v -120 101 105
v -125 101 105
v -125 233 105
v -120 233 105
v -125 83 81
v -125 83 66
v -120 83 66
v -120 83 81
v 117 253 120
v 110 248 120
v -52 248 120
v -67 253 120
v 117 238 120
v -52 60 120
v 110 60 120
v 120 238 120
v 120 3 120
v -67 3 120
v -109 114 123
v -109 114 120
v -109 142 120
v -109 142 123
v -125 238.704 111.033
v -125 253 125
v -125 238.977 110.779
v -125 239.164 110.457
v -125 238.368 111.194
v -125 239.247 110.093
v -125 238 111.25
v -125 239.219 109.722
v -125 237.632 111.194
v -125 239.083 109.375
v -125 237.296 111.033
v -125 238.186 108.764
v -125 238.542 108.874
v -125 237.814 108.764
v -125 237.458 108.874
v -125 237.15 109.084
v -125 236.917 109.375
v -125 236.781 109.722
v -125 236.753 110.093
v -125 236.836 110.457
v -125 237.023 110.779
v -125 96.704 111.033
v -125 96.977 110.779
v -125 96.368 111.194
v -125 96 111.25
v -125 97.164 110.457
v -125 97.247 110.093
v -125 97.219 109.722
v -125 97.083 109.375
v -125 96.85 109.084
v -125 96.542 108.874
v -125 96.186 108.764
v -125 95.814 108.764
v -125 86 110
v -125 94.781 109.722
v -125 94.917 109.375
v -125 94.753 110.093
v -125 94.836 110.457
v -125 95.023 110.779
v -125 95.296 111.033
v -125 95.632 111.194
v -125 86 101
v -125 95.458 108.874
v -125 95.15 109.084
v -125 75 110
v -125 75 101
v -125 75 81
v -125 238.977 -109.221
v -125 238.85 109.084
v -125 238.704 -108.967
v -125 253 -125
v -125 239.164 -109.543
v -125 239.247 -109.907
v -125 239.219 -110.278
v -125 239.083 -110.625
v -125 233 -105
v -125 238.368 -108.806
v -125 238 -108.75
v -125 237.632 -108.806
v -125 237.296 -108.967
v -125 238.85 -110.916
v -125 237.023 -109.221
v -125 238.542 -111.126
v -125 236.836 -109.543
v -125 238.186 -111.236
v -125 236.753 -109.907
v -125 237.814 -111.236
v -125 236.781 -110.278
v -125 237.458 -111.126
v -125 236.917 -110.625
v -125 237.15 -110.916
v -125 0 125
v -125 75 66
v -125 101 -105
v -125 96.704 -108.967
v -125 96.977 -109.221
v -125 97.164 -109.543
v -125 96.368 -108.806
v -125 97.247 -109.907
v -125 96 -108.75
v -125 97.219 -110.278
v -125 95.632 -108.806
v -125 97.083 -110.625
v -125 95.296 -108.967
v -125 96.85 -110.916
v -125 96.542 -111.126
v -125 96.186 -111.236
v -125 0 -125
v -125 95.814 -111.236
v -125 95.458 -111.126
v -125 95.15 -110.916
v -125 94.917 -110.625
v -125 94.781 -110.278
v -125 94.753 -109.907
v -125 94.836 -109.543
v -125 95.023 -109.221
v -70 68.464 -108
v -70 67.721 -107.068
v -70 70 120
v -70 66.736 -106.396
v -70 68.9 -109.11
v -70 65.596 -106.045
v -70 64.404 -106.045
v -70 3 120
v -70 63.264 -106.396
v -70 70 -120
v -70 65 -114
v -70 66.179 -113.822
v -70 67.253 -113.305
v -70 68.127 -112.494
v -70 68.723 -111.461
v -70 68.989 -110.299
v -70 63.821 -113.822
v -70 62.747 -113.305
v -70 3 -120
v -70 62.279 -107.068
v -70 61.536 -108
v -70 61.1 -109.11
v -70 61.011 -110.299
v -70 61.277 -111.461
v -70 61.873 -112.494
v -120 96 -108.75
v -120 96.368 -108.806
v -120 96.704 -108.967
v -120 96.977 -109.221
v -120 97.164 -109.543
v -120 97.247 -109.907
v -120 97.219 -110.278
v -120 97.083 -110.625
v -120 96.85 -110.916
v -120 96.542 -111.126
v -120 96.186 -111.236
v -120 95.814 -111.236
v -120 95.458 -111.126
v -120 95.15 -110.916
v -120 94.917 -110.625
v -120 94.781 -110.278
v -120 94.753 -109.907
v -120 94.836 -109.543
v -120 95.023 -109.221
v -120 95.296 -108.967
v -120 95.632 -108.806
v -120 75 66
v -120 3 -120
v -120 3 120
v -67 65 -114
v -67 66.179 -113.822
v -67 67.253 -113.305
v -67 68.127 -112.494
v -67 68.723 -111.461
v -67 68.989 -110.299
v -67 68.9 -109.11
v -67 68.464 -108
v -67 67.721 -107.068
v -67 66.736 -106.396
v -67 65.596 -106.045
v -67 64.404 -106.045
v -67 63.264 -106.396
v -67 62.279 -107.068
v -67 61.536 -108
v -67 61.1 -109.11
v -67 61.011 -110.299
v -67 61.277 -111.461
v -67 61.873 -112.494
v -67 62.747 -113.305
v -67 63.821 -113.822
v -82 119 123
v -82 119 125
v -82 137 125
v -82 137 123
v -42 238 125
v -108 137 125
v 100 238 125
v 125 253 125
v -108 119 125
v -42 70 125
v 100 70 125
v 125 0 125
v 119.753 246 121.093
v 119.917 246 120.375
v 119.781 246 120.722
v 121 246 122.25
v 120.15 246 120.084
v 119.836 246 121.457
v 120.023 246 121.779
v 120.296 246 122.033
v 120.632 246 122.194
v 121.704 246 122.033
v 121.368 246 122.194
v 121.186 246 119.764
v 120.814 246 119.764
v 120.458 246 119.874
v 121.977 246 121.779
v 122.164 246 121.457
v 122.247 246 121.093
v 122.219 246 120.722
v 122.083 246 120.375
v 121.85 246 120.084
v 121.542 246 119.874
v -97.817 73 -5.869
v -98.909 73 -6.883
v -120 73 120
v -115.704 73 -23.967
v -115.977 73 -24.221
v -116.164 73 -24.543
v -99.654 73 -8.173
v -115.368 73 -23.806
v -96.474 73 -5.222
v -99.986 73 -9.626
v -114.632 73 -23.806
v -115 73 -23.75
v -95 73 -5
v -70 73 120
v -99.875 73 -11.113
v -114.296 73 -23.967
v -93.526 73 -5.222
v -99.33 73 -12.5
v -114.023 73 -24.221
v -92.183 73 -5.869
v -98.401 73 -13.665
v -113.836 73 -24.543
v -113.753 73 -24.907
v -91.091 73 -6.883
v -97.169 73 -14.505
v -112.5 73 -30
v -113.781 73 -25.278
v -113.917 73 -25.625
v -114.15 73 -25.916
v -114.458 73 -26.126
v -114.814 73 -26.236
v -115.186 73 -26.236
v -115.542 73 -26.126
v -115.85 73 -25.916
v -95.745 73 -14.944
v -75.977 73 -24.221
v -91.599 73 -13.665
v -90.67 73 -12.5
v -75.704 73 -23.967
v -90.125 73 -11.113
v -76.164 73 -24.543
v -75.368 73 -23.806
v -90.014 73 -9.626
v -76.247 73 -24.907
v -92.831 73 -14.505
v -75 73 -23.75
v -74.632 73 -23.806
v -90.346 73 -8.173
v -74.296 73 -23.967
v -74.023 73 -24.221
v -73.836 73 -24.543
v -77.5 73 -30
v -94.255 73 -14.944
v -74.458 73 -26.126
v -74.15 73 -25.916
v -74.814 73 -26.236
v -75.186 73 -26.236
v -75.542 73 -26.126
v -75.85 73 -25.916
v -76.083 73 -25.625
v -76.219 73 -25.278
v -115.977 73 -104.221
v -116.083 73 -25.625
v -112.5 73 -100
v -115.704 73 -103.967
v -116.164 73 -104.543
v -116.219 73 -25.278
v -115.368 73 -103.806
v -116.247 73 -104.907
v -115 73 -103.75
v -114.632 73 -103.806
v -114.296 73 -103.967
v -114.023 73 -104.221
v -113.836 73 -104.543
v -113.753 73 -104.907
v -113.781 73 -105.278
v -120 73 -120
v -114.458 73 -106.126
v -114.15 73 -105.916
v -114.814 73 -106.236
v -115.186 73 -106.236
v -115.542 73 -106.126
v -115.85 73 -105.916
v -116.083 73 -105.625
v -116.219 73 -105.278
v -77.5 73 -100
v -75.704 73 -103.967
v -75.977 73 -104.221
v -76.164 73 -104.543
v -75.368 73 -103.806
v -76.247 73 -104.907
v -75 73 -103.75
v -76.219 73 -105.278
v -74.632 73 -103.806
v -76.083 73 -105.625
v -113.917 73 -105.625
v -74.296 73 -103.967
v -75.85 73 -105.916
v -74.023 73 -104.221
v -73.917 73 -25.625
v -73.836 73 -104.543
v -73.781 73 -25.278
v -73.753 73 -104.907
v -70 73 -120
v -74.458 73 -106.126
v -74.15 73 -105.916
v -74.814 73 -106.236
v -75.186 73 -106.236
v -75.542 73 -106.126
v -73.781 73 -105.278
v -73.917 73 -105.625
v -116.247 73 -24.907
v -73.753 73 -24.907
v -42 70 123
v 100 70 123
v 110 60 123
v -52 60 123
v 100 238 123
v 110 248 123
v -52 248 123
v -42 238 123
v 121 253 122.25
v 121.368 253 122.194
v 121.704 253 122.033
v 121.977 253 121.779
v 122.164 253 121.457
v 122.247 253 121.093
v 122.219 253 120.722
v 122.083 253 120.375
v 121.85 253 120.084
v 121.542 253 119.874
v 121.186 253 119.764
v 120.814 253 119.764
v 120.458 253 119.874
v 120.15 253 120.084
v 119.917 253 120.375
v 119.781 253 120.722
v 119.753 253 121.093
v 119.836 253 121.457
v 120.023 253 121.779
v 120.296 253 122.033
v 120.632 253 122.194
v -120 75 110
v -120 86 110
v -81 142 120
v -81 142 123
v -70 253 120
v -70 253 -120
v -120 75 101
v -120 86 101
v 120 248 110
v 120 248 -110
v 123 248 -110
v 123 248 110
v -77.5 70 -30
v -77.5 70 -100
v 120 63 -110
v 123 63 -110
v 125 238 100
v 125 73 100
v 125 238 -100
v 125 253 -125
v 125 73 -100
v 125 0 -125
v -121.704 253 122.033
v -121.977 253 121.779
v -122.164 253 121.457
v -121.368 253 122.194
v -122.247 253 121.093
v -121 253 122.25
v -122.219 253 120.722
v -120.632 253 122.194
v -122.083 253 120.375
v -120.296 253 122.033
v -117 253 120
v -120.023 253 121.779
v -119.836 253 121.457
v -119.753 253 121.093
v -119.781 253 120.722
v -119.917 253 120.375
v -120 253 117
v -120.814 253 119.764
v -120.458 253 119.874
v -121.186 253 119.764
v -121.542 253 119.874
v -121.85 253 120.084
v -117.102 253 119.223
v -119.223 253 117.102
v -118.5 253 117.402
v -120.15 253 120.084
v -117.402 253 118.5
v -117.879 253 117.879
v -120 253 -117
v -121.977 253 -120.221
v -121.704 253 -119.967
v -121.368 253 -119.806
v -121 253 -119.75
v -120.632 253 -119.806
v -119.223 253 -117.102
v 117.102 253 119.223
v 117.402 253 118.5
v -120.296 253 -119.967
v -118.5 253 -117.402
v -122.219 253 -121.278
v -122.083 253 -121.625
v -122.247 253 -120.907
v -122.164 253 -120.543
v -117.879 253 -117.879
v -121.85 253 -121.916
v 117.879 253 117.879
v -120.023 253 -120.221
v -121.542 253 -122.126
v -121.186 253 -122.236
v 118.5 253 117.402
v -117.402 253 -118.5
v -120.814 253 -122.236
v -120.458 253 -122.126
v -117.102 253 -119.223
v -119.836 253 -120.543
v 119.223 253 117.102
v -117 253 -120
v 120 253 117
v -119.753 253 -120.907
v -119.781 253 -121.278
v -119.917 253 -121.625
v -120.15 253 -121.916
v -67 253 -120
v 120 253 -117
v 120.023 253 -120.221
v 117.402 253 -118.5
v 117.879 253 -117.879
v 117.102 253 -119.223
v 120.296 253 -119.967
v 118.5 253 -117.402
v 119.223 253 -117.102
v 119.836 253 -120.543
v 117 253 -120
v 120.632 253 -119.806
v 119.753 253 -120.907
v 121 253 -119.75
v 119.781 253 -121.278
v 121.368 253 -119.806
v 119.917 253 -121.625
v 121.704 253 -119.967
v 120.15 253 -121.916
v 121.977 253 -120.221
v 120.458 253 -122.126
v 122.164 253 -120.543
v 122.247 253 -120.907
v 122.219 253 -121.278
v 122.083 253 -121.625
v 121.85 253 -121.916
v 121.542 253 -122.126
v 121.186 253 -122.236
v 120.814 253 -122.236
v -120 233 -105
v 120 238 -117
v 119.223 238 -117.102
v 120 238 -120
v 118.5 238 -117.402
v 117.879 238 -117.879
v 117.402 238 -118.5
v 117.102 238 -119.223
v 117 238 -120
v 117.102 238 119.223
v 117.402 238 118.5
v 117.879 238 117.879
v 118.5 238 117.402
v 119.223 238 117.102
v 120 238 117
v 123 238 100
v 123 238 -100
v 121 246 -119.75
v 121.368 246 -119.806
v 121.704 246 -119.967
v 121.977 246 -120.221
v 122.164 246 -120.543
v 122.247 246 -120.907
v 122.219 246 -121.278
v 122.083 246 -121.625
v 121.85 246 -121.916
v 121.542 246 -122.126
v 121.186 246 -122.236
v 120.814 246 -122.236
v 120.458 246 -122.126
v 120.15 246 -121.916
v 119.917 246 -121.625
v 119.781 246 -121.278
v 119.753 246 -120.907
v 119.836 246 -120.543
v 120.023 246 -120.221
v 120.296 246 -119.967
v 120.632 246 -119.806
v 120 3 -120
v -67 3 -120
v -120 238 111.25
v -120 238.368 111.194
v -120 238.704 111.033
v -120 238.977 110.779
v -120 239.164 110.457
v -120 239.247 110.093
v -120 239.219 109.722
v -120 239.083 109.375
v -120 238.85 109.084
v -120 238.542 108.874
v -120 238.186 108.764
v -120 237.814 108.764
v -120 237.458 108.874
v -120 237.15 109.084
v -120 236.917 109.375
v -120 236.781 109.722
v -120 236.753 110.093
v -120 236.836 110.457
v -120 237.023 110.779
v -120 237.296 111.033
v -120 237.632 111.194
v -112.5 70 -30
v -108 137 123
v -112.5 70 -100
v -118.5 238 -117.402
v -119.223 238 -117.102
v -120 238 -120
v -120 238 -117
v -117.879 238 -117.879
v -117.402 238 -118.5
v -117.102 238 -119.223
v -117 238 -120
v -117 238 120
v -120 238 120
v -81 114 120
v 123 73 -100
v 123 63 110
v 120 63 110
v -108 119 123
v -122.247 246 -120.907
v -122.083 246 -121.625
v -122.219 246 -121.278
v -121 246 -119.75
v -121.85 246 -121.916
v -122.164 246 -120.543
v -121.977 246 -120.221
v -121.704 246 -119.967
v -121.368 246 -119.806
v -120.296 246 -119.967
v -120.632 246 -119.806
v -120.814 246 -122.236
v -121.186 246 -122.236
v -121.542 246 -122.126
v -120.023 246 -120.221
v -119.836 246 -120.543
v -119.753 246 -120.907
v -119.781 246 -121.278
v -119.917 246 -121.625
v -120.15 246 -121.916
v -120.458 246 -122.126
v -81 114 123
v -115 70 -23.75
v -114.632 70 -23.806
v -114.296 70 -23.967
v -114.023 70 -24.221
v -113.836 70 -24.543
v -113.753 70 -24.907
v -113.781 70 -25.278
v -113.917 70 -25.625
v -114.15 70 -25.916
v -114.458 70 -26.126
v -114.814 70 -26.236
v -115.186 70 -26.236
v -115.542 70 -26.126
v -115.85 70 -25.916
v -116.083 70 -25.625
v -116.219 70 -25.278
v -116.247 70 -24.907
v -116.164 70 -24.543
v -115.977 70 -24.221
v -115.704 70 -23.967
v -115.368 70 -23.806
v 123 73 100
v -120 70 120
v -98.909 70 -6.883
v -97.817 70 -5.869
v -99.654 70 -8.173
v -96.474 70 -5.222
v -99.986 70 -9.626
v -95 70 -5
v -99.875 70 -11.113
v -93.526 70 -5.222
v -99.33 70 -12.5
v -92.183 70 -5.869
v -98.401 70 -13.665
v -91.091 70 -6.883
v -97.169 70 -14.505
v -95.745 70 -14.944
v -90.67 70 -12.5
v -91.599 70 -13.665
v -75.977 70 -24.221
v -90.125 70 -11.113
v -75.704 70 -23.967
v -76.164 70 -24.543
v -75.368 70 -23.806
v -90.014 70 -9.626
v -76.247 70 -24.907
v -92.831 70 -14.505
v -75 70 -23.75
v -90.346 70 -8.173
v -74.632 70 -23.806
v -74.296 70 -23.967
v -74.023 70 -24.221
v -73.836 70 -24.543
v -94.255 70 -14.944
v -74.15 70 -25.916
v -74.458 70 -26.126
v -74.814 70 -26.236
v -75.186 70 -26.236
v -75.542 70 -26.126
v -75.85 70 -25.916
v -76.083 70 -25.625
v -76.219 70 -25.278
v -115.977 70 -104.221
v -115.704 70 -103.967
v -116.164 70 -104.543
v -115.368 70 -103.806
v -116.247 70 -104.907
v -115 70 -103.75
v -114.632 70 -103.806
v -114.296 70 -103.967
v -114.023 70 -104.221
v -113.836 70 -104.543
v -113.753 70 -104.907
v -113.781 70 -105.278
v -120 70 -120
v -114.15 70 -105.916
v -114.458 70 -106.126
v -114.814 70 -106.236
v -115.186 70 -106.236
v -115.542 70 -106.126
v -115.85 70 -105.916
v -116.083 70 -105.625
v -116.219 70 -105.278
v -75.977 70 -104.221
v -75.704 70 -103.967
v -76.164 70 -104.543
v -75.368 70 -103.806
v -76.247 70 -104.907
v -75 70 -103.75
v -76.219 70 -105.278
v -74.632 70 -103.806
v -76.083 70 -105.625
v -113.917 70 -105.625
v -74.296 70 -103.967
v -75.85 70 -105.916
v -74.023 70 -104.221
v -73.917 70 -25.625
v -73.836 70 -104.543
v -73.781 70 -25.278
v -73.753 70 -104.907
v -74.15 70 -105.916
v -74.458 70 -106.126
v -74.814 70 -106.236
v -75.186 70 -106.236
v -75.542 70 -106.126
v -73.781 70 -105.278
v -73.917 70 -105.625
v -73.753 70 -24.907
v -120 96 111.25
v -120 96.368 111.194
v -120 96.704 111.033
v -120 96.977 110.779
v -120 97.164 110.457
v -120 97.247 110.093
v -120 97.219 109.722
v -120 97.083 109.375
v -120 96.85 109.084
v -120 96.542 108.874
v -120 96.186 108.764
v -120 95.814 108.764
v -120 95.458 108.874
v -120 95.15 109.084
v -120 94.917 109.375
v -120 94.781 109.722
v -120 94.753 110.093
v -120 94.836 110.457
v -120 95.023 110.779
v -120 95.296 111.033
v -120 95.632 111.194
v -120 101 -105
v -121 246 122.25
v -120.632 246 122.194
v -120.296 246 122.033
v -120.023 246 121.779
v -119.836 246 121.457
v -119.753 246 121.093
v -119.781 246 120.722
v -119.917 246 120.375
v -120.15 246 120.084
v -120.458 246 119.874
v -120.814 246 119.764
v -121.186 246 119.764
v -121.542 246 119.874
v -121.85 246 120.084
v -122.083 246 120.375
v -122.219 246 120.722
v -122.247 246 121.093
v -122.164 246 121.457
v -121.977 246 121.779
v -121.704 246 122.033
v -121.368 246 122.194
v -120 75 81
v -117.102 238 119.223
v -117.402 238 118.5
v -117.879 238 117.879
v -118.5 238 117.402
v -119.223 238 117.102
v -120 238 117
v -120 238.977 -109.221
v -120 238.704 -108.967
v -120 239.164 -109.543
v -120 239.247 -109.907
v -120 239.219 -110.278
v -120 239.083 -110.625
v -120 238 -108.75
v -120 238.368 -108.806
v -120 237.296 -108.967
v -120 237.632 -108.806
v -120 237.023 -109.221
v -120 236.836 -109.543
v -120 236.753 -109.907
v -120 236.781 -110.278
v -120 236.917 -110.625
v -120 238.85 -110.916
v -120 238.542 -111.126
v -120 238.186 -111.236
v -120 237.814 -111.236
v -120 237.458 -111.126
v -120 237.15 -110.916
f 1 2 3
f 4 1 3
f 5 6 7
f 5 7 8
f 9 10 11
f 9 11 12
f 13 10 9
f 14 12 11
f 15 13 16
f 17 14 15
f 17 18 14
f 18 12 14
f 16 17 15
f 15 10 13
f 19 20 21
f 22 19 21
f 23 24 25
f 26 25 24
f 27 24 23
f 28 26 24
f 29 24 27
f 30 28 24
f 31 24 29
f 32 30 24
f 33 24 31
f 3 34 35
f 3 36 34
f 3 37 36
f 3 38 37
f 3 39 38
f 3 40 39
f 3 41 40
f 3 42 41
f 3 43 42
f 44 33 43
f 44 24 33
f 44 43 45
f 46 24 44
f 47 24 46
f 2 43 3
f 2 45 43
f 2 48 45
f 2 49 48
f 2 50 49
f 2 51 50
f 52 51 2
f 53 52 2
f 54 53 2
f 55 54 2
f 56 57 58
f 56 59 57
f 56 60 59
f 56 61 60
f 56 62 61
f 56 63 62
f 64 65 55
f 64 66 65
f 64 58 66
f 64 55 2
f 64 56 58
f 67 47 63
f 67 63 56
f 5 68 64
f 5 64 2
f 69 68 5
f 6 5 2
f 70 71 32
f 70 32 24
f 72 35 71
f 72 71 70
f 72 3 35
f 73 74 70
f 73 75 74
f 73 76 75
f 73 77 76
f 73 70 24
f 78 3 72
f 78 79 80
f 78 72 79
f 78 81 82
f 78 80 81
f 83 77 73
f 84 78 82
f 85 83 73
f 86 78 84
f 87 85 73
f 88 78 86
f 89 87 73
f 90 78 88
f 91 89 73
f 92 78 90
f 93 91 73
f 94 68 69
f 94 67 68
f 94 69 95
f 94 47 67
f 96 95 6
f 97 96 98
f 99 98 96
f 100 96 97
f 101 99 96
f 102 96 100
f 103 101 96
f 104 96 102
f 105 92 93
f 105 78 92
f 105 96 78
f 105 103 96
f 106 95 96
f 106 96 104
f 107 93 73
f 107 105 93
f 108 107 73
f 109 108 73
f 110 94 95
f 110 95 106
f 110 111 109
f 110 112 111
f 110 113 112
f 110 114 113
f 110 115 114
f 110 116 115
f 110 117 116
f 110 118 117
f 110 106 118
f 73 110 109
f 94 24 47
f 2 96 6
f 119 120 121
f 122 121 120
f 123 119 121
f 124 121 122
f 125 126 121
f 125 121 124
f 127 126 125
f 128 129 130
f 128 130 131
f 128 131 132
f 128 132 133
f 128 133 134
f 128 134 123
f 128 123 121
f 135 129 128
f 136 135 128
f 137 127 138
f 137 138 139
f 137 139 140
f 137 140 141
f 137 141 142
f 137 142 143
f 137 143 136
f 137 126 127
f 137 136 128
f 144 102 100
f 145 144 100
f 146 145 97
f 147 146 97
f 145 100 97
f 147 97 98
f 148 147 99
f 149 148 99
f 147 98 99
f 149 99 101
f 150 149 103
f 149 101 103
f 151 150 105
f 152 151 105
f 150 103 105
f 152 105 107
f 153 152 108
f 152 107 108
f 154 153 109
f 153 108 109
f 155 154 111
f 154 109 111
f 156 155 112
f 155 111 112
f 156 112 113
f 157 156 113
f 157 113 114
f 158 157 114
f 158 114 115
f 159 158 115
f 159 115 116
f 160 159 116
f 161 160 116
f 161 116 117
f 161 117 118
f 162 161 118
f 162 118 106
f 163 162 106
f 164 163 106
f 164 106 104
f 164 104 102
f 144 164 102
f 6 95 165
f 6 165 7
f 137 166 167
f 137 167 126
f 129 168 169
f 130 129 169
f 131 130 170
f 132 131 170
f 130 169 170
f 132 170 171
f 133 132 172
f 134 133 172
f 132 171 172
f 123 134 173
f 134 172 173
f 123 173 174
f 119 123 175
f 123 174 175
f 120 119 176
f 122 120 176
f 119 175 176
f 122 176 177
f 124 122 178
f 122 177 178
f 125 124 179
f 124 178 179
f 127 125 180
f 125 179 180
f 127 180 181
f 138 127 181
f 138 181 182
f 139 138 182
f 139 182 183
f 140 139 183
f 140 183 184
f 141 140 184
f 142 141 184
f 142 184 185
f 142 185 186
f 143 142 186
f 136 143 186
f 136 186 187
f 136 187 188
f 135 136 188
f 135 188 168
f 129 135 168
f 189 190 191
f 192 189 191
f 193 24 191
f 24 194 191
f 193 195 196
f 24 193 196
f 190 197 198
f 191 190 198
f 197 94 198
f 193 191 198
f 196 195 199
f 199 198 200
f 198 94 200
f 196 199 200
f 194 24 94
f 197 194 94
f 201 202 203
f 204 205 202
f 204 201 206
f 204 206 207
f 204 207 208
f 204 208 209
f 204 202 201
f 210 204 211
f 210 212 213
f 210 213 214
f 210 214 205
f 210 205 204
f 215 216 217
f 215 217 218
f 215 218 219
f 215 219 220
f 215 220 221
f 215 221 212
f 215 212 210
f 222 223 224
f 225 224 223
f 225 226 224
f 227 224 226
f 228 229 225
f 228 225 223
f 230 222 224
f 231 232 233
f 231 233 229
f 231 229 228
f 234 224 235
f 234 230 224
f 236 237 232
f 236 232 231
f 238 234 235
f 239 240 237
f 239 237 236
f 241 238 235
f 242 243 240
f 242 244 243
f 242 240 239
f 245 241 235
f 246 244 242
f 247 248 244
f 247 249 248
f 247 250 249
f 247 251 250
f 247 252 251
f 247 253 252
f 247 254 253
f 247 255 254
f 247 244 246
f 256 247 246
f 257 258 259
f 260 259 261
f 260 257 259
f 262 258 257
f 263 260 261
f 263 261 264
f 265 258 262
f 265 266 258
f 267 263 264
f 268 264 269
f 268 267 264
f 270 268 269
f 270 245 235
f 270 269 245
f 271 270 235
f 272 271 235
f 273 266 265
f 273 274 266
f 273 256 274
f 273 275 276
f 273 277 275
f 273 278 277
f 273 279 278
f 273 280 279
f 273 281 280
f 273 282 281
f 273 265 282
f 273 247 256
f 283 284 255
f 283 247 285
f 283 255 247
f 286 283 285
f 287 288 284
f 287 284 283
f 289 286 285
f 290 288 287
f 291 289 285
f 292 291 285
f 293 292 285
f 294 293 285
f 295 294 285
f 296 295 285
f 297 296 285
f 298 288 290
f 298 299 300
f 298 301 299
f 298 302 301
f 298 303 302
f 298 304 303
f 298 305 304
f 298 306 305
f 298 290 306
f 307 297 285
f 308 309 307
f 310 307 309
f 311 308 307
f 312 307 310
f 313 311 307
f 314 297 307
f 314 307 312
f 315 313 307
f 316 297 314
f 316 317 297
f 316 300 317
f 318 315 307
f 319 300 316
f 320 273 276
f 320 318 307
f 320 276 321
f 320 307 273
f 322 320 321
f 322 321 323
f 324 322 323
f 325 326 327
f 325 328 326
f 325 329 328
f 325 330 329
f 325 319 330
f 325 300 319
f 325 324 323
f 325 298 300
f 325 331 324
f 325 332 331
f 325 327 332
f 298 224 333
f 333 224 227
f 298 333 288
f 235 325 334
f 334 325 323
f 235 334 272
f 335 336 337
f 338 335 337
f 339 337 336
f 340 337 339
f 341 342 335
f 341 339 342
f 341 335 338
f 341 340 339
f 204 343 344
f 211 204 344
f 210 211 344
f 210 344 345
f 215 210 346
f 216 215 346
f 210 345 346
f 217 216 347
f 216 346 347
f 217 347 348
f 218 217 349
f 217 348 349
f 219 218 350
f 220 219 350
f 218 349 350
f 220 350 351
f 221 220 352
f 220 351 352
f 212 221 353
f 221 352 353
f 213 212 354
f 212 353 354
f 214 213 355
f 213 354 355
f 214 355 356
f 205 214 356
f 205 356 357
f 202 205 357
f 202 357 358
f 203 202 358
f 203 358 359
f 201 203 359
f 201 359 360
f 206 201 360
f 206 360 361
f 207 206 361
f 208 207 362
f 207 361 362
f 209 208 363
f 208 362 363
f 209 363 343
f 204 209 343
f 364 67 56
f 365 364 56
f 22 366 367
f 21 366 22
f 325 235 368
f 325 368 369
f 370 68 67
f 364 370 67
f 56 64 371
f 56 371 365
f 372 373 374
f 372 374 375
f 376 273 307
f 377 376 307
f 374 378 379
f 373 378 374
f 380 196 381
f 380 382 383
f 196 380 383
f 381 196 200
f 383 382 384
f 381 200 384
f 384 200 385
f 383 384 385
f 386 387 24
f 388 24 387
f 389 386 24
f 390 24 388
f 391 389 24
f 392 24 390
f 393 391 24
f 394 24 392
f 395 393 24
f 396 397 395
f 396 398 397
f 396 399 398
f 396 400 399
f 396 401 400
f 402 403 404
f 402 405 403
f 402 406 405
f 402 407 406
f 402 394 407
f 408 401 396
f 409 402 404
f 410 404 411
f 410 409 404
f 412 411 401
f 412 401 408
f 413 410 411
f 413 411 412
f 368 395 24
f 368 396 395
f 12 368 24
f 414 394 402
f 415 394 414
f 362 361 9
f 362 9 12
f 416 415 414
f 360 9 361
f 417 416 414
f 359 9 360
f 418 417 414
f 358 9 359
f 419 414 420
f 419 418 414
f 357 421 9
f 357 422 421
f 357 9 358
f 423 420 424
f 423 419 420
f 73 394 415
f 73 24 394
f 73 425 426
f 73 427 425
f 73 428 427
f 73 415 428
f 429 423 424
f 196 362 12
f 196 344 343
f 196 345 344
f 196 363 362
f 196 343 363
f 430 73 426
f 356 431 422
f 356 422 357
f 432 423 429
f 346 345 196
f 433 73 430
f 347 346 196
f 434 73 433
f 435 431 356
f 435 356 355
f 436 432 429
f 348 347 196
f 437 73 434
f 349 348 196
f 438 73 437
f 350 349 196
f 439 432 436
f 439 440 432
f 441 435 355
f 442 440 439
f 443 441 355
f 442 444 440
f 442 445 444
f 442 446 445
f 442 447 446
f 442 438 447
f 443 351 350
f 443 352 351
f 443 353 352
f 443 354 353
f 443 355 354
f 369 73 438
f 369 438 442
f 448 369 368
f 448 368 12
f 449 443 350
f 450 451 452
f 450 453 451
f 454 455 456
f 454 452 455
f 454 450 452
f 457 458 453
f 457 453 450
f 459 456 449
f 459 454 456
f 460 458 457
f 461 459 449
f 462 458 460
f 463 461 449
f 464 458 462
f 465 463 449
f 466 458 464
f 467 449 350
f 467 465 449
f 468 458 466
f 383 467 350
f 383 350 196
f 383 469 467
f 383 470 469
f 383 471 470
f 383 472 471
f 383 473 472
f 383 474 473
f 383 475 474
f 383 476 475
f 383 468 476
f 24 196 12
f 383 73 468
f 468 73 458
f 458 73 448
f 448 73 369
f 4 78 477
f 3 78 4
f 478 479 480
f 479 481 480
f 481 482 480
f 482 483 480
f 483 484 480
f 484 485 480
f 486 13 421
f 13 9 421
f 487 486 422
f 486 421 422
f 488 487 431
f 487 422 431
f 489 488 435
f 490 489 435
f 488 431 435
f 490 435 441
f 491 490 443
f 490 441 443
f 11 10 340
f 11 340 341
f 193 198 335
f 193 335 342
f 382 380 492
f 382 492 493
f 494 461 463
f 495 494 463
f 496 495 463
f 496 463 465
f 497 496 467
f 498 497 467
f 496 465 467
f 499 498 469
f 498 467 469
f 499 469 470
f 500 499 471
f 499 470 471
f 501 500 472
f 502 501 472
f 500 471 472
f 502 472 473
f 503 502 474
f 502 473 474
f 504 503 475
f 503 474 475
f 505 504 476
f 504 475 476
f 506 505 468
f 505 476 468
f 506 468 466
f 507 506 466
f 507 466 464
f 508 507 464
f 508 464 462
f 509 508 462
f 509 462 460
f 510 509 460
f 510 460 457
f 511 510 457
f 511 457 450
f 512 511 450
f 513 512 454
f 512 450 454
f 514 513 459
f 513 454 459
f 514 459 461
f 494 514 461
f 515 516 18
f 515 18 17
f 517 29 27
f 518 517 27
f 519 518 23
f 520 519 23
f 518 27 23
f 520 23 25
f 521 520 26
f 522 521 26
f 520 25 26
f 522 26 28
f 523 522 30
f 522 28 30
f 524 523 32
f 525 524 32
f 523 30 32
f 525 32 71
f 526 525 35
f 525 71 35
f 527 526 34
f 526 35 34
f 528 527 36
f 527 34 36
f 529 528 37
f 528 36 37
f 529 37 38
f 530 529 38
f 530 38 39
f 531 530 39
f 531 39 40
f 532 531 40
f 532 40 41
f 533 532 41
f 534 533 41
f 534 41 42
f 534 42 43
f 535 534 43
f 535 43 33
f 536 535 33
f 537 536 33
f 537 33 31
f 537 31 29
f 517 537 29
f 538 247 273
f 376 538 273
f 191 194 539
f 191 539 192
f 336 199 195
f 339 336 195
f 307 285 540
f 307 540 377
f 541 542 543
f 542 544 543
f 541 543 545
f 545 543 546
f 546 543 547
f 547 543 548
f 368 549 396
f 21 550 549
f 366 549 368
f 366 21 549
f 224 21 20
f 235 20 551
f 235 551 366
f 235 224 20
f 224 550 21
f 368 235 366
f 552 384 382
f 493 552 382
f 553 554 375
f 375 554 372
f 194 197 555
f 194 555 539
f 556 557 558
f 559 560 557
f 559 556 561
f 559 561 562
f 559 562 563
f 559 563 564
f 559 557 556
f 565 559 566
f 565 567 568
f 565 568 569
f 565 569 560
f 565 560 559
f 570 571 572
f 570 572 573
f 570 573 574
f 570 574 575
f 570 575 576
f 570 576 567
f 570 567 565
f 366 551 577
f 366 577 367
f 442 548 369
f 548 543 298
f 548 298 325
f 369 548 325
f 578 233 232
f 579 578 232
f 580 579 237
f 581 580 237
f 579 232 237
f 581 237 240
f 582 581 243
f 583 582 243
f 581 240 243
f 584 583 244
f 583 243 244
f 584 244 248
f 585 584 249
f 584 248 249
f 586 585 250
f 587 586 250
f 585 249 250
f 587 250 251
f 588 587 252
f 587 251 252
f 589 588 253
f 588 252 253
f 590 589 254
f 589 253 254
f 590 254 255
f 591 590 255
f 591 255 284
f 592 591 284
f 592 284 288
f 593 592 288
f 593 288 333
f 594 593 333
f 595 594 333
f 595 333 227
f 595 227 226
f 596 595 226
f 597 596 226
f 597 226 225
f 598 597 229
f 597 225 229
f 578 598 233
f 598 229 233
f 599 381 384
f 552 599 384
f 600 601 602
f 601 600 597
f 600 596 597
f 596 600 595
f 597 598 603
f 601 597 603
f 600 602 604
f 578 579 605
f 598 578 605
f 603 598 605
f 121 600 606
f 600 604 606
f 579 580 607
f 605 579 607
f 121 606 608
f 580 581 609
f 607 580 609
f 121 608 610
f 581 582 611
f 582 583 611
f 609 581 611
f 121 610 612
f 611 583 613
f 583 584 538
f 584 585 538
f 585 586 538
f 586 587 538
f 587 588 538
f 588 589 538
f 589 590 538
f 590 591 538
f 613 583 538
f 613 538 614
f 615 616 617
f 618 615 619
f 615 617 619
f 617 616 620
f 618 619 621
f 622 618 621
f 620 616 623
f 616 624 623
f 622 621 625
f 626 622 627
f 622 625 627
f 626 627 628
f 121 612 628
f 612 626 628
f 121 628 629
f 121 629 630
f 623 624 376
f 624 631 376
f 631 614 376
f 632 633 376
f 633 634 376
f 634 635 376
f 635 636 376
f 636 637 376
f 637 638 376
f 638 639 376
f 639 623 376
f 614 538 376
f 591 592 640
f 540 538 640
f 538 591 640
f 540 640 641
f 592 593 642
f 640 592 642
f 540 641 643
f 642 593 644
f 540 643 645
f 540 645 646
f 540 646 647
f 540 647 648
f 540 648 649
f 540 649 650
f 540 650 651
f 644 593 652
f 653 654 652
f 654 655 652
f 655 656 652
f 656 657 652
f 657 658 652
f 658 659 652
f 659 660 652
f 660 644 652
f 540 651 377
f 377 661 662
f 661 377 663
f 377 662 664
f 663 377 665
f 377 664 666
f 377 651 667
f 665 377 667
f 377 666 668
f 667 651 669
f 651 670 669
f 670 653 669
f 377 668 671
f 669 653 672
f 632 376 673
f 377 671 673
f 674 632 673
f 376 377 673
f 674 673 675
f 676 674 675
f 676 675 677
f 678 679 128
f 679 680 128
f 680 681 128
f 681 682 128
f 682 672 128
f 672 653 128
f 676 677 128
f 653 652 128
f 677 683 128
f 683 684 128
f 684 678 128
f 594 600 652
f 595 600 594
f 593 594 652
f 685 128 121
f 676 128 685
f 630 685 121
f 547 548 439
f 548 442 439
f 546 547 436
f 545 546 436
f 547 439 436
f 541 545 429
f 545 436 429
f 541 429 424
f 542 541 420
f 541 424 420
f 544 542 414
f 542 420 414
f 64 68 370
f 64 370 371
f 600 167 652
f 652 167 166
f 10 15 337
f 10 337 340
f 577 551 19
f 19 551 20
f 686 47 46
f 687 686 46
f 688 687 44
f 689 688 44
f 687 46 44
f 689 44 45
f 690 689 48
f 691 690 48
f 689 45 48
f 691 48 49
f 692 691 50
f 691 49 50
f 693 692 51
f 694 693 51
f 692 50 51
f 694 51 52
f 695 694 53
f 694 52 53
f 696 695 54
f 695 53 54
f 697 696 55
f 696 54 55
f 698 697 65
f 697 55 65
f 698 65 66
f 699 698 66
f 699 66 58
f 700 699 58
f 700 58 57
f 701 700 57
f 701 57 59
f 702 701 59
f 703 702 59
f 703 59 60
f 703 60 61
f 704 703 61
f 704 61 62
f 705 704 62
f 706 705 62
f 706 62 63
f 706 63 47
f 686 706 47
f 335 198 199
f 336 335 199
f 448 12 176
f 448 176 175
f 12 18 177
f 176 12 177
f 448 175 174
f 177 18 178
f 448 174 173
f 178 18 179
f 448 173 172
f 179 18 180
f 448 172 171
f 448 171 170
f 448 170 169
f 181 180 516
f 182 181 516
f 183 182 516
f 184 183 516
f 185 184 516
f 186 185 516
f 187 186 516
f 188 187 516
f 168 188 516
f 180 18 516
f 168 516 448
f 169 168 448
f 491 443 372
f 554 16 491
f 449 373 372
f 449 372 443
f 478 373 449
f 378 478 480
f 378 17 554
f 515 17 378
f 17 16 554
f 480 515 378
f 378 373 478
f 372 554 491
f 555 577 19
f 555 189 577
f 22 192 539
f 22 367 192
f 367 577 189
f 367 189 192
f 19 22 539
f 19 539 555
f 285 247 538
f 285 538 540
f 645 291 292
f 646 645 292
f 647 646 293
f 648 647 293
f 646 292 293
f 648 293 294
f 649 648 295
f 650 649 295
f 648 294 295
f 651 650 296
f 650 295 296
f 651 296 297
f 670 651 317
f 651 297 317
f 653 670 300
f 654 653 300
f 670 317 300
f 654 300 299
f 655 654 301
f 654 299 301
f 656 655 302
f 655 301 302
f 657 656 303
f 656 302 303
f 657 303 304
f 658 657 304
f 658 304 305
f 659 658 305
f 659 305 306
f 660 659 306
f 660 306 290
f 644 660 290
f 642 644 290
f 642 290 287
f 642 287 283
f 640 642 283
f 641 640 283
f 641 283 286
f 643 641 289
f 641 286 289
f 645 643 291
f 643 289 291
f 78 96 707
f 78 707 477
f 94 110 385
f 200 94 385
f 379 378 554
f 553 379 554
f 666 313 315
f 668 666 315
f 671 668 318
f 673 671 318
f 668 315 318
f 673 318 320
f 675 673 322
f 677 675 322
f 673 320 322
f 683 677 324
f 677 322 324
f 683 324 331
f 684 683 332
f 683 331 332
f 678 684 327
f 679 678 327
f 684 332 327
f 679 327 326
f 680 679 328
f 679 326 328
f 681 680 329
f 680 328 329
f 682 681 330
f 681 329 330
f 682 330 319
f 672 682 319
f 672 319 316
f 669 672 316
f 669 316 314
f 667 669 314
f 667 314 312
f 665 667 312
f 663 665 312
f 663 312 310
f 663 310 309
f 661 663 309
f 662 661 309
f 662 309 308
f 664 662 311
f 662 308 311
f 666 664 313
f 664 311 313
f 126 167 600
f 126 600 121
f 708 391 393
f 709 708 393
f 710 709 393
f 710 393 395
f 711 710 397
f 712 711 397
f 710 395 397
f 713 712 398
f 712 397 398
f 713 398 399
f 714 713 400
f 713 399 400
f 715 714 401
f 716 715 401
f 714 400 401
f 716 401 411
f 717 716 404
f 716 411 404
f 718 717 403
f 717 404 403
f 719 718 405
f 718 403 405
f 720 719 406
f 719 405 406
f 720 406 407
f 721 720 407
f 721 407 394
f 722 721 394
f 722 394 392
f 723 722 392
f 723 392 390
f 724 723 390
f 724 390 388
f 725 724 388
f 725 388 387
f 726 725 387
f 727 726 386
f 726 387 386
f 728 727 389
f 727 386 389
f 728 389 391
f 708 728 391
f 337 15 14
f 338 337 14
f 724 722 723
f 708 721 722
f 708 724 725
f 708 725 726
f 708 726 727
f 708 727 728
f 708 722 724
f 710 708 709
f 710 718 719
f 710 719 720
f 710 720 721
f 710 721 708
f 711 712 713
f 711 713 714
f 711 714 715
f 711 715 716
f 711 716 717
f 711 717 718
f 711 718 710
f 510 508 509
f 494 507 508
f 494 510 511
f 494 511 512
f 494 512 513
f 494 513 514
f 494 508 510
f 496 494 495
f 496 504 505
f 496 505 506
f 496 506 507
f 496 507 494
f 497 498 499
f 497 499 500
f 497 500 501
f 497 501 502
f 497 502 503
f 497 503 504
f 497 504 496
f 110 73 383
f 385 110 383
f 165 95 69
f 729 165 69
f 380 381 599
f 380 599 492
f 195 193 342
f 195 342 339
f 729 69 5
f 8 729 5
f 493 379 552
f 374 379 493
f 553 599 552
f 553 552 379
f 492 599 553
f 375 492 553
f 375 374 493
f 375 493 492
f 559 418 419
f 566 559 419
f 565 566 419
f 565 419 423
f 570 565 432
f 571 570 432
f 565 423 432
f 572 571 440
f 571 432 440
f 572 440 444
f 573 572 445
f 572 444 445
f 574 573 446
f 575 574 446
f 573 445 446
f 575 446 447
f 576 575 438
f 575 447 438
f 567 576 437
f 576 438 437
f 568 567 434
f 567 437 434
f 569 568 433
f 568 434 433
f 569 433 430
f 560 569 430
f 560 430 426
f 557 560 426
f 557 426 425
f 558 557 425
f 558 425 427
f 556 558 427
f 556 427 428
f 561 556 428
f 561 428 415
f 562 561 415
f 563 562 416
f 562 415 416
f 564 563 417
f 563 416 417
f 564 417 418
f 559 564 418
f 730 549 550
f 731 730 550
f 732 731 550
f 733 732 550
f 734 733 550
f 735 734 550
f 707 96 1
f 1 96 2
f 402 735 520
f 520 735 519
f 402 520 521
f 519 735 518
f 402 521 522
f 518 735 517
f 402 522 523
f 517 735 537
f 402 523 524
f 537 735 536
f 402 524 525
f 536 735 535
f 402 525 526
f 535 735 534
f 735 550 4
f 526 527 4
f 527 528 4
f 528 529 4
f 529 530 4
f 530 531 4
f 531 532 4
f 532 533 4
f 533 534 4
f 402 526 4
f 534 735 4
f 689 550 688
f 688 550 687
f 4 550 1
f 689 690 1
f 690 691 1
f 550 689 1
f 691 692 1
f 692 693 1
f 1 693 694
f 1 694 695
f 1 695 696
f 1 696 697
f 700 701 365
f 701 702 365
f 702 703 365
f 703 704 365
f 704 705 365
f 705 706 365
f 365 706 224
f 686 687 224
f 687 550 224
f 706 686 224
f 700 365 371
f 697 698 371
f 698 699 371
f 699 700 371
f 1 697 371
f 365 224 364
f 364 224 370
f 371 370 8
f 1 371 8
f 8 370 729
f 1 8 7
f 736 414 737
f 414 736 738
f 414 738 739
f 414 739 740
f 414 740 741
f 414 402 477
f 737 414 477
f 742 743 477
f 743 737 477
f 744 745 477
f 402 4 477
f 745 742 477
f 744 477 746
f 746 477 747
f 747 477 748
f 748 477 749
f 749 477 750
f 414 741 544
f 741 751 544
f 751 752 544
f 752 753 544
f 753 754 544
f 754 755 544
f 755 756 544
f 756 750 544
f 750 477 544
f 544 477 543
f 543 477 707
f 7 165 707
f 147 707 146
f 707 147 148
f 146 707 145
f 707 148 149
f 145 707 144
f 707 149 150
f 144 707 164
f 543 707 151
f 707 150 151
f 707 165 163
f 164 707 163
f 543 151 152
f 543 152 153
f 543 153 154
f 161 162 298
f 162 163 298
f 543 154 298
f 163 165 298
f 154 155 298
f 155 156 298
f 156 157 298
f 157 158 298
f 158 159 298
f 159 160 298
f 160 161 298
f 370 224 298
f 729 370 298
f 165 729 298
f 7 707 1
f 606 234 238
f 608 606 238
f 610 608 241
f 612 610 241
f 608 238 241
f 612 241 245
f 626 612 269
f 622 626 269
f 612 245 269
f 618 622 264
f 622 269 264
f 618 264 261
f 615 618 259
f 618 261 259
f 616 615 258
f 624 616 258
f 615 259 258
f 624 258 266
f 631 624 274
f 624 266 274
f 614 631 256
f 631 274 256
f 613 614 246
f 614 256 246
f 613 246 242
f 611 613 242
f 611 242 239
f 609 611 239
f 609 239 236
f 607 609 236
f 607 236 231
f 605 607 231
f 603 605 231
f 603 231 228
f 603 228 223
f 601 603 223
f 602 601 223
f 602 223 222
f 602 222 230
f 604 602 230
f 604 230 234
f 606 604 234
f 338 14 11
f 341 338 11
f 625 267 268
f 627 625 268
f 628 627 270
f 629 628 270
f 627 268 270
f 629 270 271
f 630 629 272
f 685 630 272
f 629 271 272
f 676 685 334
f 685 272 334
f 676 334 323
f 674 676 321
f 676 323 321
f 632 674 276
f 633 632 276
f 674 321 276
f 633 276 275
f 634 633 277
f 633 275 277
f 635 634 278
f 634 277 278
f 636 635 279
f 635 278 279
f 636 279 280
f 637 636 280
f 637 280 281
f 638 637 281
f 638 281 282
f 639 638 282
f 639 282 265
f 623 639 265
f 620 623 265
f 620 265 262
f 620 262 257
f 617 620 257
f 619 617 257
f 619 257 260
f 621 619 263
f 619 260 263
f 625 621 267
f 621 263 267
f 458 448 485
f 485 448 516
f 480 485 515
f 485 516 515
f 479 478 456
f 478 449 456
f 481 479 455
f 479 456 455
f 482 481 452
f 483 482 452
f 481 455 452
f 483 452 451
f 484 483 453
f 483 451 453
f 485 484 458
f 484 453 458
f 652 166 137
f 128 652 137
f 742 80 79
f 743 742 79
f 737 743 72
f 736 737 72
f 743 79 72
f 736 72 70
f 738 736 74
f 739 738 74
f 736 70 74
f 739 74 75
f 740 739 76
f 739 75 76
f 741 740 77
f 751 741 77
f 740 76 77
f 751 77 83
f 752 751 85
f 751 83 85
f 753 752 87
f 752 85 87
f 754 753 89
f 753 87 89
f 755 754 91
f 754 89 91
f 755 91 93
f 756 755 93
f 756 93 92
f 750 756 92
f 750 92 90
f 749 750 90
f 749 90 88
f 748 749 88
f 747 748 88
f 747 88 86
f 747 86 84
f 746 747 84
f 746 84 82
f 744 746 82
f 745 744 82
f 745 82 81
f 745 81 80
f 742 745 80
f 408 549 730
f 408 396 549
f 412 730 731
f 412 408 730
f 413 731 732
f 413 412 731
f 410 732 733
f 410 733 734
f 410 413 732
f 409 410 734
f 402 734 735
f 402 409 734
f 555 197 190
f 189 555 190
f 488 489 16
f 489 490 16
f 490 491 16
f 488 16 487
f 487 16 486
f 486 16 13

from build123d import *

# Parameters (mm, degrees)
SKETCH_1_W           = 250
SKETCH_1_H           = 250
EXTRUDE_1_DEPTH      = 3
SKETCH_2_W           = 250
SKETCH_2_H           = 250
SKETCH_2_W_2         = 240
SKETCH_2_H_2         = 240
EXTRUDE_2_DEPTH      = 250
SKETCH_3_W           = 3
SKETCH_3_H           = 240
EXTRUDE_3_DEPTH      = 250
SKETCH_8_W           = 200
SKETCH_8_H           = 165
CUT_EXTRUDE_4_DEPTH  = 8
SKETCH_9_W           = 220
SKETCH_9_H           = 185
CUT_EXTRUDE_5_DEPTH  = 3
SKETCH_11_W          = 142
SKETCH_11_H          = 168
CUT_EXTRUDE_6_DEPTH  = 10
SKETCH_12_W          = 162
SKETCH_12_H          = 188
CUT_EXTRUDE_7_DEPTH  = 3
SKETCH_16_W          = 26
SKETCH_16_H          = 18
CUT_EXTRUDE_10_DEPTH = 5
SKETCH_17_W          = 9
SKETCH_17_H          = 11
SKETCH_17_W_2        = 15
SKETCH_17_H_2        = 8
CUT_EXTRUDE_11_DEPTH = 10
SKETCH_21_W          = 28
SKETCH_21_H          = 28
CUT_EXTRUDE_14_DEPTH = 3
SKETCH_22_W          = 50
SKETCH_22_H          = 3
EXTRUDE_4_DEPTH      = 240
SKETCH_24_R          = 4
CUT_EXTRUDE_15_DEPTH = 10
SKETCH_25_W          = 210
SKETCH_25_H          = 132
CUT_EXTRUDE_16_DEPTH = 10
SKETCH_26_R          = 1.25
CUT_EXTRUDE_17_DEPTH = 10
SKETCH_27_R          = 5
CUT_EXTRUDE_18_DEPTH = 10
SKETCH_29_W          = 35
SKETCH_29_H          = 70
CUT_EXTRUDE_19_DEPTH = 10
SKETCH_30_R          = 1.25
CUT_EXTRUDE_20_DEPTH = 3
SKETCH_31_W          = 3
SKETCH_31_H          = 15
EXTRUDE_5_DEPTH      = 3
SKETCH_32_W          = 3
SKETCH_32_H          = 15
EXTRUDE_6_DEPTH      = 3
SKETCH_33_R          = 1.25
CUT_EXTRUDE_21_DEPTH = 7
FILLET_1_R           = 3


with BuildPart() as part:
    # Эскиз1 → Бобышка-Вытянуть1 (new body)
    with BuildSketch(Plane(origin=(0, 0, 0), x_dir=(1, 0, 0), z_dir=(0, 1, 0))):
        Rectangle(SKETCH_1_W, SKETCH_1_H)
    extrude(amount=EXTRUDE_1_DEPTH)

    # Эскиз2 → Бобышка-Вытянуть2 (add)
    with BuildSketch(Plane(origin=(0, 3, 0), x_dir=(1, 0, 0), z_dir=(0, 1, 0))):
        Rectangle(SKETCH_2_W, SKETCH_2_H)
        Rectangle(SKETCH_2_W_2, SKETCH_2_H_2, mode=Mode.SUBTRACT)
    extrude(amount=EXTRUDE_2_DEPTH)

    # Эскиз3 → Бобышка-Вытянуть3 (add)
    with BuildSketch(Plane(origin=(0, 3, 0), x_dir=(1, 0, 0), z_dir=(0, 1, 0))):
        with Locations((-68.5, 0)):
            Rectangle(SKETCH_3_W, SKETCH_3_H)
    extrude(amount=EXTRUDE_3_DEPTH)

    # Эскиз8 → Вырез-Вытянуть4 (cut)
    with BuildSketch(Plane(origin=(125, 0, 0), x_dir=(0, 0, -1), z_dir=(1, 0, 0))):
        with Locations((0, 155.5)):
            Rectangle(SKETCH_8_W, SKETCH_8_H)
    extrude(amount=-CUT_EXTRUDE_4_DEPTH, mode=Mode.SUBTRACT)

    # Эскиз9 → Вырез-Вытянуть5 (cut)
    with BuildSketch(Plane.ZY.offset(-120)):
        with Locations((0, 155.5)):
            Rectangle(SKETCH_9_W, SKETCH_9_H)
    extrude(amount=-CUT_EXTRUDE_5_DEPTH, mode=Mode.SUBTRACT)

    # Эскиз11 → Вырез-Вытянуть6 (cut)
    with BuildSketch(Plane.XY.offset(125)):
        with Locations((29, 154)):
            Rectangle(SKETCH_11_W, SKETCH_11_H)
    extrude(amount=-CUT_EXTRUDE_6_DEPTH, mode=Mode.SUBTRACT)

    # Эскиз12 → Вырез-Вытянуть7 (cut)
    with BuildSketch(Plane(origin=(0, 0, 120), x_dir=(-1, 0, 0), z_dir=(0, 0, -1))):
        with Locations((-29, 154)):
            Rectangle(SKETCH_12_W, SKETCH_12_H)
    extrude(amount=-CUT_EXTRUDE_7_DEPTH, mode=Mode.SUBTRACT)

    # Эскиз16 → Вырез-Вытянуть10 (cut)
    with BuildSketch(Plane.XY.offset(125)):
        with Locations((-95, 128)):
            Rectangle(SKETCH_16_W, SKETCH_16_H)
    extrude(amount=-CUT_EXTRUDE_10_DEPTH, mode=Mode.SUBTRACT)

    # Эскиз17 → Вырез-Вытянуть11 (cut)
    with BuildSketch(Plane.ZY.offset(125)):
        with Locations((105.5, 80.5)):
            Rectangle(SKETCH_17_W, SKETCH_17_H)
        with Locations((73.5, 79)):
            Rectangle(SKETCH_17_W_2, SKETCH_17_H_2)
    extrude(amount=-CUT_EXTRUDE_11_DEPTH, mode=Mode.SUBTRACT)

    # Эскиз21 → Вырез-Вытянуть14 (cut)
    with BuildSketch(Plane(origin=(0, 0, 120), x_dir=(-1, 0, 0), z_dir=(0, 0, -1))):
        with Locations((95, 128)):
            Rectangle(SKETCH_21_W, SKETCH_21_H)
    extrude(amount=-CUT_EXTRUDE_14_DEPTH, mode=Mode.SUBTRACT)

    # Эскиз22 → Бобышка-Вытянуть4 (add)
    with BuildSketch(Plane.XY.offset(-120)):
        with Locations((-95, 71.5)):
            Rectangle(SKETCH_22_W, SKETCH_22_H)
    extrude(amount=EXTRUDE_4_DEPTH)

    # Эскиз24 → Вырез-Вытянуть15 (cut)
    with BuildSketch(Plane(origin=(-67, 0, 0), x_dir=(0, 0, -1), z_dir=(1, 0, 0))):
        with Locations((110, 65)):
            Circle(SKETCH_24_R)
    extrude(amount=-CUT_EXTRUDE_15_DEPTH, mode=Mode.SUBTRACT)

    # Эскиз25 → Вырез-Вытянуть16 (cut)
    with BuildSketch(Plane.ZY.offset(125)):
        with Locations((0, 167)):
            Rectangle(SKETCH_25_W, SKETCH_25_H)
    extrude(amount=-CUT_EXTRUDE_16_DEPTH, mode=Mode.SUBTRACT)

    # Эскиз26 → Вырез-Вытянуть17 (cut)
    with BuildSketch(Plane.ZY.offset(125)):
        with Locations((-110, 238)):
            Circle(SKETCH_26_R)
        with Locations((110, 238)):
            Circle(SKETCH_26_R)
        with Locations((110, 96)):
            Circle(SKETCH_26_R)
        with Locations((-110, 96)):
            Circle(SKETCH_26_R)
    extrude(amount=-CUT_EXTRUDE_17_DEPTH, mode=Mode.SUBTRACT)

    # Эскиз27 → Вырез-Вытянуть18 (cut)
    with BuildSketch(Plane(origin=(0, 73, 0), x_dir=(1, 0, 0), z_dir=(0, 1, 0))):
        with Locations(Location((-95, 10, 0), (0, 0, 270))):
            Circle(SKETCH_27_R)
    extrude(amount=-CUT_EXTRUDE_18_DEPTH, mode=Mode.SUBTRACT)

    # Эскиз29 → Вырез-Вытянуть19 (cut)
    with BuildSketch(Plane(origin=(0, 73, 0), x_dir=(1, 0, 0), z_dir=(0, 1, 0))):
        with Locations((-95, 65)):
            Rectangle(SKETCH_29_W, SKETCH_29_H)
    extrude(amount=-CUT_EXTRUDE_19_DEPTH, mode=Mode.SUBTRACT)

    # Эскиз30 → Вырез-Вытянуть20 (cut)
    with BuildSketch(Plane(origin=(0, 73, 0), x_dir=(1, 0, 0), z_dir=(0, 1, 0))):
        with Locations(Location((-75, 105, 0), (0, 0, 270))):
            Circle(SKETCH_30_R)
        with Locations(Location((-115, 105, 0), (0, 0, 270))):
            Circle(SKETCH_30_R)
        with Locations(Location((-115, 25, 0), (0, 0, 270))):
            Circle(SKETCH_30_R)
        with Locations(Location((-75, 25, 0), (0, 0, 270))):
            Circle(SKETCH_30_R)
    extrude(amount=-CUT_EXTRUDE_20_DEPTH, mode=Mode.SUBTRACT)

    # Эскиз31 → Бобышка-Вытянуть5 (add)
    with BuildSketch(Plane.XY.offset(-120)):
        with Locations((118.5, 245.5)):
            Rectangle(SKETCH_31_W, SKETCH_31_H)
        with Locations((-118.5, 245.5)):
            Rectangle(SKETCH_31_W, SKETCH_31_H)
    extrude(amount=EXTRUDE_5_DEPTH)

    # Эскиз32 → Бобышка-Вытянуть6 (add)
    with BuildSketch(Plane(origin=(0, 0, 120), x_dir=(-1, 0, 0), z_dir=(0, 0, -1))):
        with Locations((-118.5, 245.5)):
            Rectangle(SKETCH_32_W, SKETCH_32_H)
        with Locations((118.5, 245.5)):
            Rectangle(SKETCH_32_W, SKETCH_32_H)
    extrude(amount=EXTRUDE_6_DEPTH)

    # Эскиз33 → Вырез-Вытянуть21 (cut)
    with BuildSketch(Plane(origin=(0, 253, 0), x_dir=(1, 0, 0), z_dir=(0, 1, 0))):
        with Locations(Location((-121, -121, 0), (0, 0, 270))):
            Circle(SKETCH_33_R)
        with Locations(Location((-121, 121, 0), (0, 0, 270))):
            Circle(SKETCH_33_R)
        with Locations(Location((121, 121, 0), (0, 0, 270))):
            Circle(SKETCH_33_R)
        with Locations(Location((121, -121, 0), (0, 0, 270))):
            Circle(SKETCH_33_R)
    extrude(amount=-CUT_EXTRUDE_21_DEPTH, mode=Mode.SUBTRACT)

    # Скругление1
    fillet_1_edges = [part.edges().sort_by_distance(p)[0] for p in [
        (117, 245.5, -117),
        (-117, 245.5, -117),
        (117, 245.5, 117),
        (-117, 245.5, 117),
    ]]
    fillet(fillet_1_edges, radius=FILLET_1_R - 0.0001)  # a hair under: the kernel refuses the full size


solid = part.part
